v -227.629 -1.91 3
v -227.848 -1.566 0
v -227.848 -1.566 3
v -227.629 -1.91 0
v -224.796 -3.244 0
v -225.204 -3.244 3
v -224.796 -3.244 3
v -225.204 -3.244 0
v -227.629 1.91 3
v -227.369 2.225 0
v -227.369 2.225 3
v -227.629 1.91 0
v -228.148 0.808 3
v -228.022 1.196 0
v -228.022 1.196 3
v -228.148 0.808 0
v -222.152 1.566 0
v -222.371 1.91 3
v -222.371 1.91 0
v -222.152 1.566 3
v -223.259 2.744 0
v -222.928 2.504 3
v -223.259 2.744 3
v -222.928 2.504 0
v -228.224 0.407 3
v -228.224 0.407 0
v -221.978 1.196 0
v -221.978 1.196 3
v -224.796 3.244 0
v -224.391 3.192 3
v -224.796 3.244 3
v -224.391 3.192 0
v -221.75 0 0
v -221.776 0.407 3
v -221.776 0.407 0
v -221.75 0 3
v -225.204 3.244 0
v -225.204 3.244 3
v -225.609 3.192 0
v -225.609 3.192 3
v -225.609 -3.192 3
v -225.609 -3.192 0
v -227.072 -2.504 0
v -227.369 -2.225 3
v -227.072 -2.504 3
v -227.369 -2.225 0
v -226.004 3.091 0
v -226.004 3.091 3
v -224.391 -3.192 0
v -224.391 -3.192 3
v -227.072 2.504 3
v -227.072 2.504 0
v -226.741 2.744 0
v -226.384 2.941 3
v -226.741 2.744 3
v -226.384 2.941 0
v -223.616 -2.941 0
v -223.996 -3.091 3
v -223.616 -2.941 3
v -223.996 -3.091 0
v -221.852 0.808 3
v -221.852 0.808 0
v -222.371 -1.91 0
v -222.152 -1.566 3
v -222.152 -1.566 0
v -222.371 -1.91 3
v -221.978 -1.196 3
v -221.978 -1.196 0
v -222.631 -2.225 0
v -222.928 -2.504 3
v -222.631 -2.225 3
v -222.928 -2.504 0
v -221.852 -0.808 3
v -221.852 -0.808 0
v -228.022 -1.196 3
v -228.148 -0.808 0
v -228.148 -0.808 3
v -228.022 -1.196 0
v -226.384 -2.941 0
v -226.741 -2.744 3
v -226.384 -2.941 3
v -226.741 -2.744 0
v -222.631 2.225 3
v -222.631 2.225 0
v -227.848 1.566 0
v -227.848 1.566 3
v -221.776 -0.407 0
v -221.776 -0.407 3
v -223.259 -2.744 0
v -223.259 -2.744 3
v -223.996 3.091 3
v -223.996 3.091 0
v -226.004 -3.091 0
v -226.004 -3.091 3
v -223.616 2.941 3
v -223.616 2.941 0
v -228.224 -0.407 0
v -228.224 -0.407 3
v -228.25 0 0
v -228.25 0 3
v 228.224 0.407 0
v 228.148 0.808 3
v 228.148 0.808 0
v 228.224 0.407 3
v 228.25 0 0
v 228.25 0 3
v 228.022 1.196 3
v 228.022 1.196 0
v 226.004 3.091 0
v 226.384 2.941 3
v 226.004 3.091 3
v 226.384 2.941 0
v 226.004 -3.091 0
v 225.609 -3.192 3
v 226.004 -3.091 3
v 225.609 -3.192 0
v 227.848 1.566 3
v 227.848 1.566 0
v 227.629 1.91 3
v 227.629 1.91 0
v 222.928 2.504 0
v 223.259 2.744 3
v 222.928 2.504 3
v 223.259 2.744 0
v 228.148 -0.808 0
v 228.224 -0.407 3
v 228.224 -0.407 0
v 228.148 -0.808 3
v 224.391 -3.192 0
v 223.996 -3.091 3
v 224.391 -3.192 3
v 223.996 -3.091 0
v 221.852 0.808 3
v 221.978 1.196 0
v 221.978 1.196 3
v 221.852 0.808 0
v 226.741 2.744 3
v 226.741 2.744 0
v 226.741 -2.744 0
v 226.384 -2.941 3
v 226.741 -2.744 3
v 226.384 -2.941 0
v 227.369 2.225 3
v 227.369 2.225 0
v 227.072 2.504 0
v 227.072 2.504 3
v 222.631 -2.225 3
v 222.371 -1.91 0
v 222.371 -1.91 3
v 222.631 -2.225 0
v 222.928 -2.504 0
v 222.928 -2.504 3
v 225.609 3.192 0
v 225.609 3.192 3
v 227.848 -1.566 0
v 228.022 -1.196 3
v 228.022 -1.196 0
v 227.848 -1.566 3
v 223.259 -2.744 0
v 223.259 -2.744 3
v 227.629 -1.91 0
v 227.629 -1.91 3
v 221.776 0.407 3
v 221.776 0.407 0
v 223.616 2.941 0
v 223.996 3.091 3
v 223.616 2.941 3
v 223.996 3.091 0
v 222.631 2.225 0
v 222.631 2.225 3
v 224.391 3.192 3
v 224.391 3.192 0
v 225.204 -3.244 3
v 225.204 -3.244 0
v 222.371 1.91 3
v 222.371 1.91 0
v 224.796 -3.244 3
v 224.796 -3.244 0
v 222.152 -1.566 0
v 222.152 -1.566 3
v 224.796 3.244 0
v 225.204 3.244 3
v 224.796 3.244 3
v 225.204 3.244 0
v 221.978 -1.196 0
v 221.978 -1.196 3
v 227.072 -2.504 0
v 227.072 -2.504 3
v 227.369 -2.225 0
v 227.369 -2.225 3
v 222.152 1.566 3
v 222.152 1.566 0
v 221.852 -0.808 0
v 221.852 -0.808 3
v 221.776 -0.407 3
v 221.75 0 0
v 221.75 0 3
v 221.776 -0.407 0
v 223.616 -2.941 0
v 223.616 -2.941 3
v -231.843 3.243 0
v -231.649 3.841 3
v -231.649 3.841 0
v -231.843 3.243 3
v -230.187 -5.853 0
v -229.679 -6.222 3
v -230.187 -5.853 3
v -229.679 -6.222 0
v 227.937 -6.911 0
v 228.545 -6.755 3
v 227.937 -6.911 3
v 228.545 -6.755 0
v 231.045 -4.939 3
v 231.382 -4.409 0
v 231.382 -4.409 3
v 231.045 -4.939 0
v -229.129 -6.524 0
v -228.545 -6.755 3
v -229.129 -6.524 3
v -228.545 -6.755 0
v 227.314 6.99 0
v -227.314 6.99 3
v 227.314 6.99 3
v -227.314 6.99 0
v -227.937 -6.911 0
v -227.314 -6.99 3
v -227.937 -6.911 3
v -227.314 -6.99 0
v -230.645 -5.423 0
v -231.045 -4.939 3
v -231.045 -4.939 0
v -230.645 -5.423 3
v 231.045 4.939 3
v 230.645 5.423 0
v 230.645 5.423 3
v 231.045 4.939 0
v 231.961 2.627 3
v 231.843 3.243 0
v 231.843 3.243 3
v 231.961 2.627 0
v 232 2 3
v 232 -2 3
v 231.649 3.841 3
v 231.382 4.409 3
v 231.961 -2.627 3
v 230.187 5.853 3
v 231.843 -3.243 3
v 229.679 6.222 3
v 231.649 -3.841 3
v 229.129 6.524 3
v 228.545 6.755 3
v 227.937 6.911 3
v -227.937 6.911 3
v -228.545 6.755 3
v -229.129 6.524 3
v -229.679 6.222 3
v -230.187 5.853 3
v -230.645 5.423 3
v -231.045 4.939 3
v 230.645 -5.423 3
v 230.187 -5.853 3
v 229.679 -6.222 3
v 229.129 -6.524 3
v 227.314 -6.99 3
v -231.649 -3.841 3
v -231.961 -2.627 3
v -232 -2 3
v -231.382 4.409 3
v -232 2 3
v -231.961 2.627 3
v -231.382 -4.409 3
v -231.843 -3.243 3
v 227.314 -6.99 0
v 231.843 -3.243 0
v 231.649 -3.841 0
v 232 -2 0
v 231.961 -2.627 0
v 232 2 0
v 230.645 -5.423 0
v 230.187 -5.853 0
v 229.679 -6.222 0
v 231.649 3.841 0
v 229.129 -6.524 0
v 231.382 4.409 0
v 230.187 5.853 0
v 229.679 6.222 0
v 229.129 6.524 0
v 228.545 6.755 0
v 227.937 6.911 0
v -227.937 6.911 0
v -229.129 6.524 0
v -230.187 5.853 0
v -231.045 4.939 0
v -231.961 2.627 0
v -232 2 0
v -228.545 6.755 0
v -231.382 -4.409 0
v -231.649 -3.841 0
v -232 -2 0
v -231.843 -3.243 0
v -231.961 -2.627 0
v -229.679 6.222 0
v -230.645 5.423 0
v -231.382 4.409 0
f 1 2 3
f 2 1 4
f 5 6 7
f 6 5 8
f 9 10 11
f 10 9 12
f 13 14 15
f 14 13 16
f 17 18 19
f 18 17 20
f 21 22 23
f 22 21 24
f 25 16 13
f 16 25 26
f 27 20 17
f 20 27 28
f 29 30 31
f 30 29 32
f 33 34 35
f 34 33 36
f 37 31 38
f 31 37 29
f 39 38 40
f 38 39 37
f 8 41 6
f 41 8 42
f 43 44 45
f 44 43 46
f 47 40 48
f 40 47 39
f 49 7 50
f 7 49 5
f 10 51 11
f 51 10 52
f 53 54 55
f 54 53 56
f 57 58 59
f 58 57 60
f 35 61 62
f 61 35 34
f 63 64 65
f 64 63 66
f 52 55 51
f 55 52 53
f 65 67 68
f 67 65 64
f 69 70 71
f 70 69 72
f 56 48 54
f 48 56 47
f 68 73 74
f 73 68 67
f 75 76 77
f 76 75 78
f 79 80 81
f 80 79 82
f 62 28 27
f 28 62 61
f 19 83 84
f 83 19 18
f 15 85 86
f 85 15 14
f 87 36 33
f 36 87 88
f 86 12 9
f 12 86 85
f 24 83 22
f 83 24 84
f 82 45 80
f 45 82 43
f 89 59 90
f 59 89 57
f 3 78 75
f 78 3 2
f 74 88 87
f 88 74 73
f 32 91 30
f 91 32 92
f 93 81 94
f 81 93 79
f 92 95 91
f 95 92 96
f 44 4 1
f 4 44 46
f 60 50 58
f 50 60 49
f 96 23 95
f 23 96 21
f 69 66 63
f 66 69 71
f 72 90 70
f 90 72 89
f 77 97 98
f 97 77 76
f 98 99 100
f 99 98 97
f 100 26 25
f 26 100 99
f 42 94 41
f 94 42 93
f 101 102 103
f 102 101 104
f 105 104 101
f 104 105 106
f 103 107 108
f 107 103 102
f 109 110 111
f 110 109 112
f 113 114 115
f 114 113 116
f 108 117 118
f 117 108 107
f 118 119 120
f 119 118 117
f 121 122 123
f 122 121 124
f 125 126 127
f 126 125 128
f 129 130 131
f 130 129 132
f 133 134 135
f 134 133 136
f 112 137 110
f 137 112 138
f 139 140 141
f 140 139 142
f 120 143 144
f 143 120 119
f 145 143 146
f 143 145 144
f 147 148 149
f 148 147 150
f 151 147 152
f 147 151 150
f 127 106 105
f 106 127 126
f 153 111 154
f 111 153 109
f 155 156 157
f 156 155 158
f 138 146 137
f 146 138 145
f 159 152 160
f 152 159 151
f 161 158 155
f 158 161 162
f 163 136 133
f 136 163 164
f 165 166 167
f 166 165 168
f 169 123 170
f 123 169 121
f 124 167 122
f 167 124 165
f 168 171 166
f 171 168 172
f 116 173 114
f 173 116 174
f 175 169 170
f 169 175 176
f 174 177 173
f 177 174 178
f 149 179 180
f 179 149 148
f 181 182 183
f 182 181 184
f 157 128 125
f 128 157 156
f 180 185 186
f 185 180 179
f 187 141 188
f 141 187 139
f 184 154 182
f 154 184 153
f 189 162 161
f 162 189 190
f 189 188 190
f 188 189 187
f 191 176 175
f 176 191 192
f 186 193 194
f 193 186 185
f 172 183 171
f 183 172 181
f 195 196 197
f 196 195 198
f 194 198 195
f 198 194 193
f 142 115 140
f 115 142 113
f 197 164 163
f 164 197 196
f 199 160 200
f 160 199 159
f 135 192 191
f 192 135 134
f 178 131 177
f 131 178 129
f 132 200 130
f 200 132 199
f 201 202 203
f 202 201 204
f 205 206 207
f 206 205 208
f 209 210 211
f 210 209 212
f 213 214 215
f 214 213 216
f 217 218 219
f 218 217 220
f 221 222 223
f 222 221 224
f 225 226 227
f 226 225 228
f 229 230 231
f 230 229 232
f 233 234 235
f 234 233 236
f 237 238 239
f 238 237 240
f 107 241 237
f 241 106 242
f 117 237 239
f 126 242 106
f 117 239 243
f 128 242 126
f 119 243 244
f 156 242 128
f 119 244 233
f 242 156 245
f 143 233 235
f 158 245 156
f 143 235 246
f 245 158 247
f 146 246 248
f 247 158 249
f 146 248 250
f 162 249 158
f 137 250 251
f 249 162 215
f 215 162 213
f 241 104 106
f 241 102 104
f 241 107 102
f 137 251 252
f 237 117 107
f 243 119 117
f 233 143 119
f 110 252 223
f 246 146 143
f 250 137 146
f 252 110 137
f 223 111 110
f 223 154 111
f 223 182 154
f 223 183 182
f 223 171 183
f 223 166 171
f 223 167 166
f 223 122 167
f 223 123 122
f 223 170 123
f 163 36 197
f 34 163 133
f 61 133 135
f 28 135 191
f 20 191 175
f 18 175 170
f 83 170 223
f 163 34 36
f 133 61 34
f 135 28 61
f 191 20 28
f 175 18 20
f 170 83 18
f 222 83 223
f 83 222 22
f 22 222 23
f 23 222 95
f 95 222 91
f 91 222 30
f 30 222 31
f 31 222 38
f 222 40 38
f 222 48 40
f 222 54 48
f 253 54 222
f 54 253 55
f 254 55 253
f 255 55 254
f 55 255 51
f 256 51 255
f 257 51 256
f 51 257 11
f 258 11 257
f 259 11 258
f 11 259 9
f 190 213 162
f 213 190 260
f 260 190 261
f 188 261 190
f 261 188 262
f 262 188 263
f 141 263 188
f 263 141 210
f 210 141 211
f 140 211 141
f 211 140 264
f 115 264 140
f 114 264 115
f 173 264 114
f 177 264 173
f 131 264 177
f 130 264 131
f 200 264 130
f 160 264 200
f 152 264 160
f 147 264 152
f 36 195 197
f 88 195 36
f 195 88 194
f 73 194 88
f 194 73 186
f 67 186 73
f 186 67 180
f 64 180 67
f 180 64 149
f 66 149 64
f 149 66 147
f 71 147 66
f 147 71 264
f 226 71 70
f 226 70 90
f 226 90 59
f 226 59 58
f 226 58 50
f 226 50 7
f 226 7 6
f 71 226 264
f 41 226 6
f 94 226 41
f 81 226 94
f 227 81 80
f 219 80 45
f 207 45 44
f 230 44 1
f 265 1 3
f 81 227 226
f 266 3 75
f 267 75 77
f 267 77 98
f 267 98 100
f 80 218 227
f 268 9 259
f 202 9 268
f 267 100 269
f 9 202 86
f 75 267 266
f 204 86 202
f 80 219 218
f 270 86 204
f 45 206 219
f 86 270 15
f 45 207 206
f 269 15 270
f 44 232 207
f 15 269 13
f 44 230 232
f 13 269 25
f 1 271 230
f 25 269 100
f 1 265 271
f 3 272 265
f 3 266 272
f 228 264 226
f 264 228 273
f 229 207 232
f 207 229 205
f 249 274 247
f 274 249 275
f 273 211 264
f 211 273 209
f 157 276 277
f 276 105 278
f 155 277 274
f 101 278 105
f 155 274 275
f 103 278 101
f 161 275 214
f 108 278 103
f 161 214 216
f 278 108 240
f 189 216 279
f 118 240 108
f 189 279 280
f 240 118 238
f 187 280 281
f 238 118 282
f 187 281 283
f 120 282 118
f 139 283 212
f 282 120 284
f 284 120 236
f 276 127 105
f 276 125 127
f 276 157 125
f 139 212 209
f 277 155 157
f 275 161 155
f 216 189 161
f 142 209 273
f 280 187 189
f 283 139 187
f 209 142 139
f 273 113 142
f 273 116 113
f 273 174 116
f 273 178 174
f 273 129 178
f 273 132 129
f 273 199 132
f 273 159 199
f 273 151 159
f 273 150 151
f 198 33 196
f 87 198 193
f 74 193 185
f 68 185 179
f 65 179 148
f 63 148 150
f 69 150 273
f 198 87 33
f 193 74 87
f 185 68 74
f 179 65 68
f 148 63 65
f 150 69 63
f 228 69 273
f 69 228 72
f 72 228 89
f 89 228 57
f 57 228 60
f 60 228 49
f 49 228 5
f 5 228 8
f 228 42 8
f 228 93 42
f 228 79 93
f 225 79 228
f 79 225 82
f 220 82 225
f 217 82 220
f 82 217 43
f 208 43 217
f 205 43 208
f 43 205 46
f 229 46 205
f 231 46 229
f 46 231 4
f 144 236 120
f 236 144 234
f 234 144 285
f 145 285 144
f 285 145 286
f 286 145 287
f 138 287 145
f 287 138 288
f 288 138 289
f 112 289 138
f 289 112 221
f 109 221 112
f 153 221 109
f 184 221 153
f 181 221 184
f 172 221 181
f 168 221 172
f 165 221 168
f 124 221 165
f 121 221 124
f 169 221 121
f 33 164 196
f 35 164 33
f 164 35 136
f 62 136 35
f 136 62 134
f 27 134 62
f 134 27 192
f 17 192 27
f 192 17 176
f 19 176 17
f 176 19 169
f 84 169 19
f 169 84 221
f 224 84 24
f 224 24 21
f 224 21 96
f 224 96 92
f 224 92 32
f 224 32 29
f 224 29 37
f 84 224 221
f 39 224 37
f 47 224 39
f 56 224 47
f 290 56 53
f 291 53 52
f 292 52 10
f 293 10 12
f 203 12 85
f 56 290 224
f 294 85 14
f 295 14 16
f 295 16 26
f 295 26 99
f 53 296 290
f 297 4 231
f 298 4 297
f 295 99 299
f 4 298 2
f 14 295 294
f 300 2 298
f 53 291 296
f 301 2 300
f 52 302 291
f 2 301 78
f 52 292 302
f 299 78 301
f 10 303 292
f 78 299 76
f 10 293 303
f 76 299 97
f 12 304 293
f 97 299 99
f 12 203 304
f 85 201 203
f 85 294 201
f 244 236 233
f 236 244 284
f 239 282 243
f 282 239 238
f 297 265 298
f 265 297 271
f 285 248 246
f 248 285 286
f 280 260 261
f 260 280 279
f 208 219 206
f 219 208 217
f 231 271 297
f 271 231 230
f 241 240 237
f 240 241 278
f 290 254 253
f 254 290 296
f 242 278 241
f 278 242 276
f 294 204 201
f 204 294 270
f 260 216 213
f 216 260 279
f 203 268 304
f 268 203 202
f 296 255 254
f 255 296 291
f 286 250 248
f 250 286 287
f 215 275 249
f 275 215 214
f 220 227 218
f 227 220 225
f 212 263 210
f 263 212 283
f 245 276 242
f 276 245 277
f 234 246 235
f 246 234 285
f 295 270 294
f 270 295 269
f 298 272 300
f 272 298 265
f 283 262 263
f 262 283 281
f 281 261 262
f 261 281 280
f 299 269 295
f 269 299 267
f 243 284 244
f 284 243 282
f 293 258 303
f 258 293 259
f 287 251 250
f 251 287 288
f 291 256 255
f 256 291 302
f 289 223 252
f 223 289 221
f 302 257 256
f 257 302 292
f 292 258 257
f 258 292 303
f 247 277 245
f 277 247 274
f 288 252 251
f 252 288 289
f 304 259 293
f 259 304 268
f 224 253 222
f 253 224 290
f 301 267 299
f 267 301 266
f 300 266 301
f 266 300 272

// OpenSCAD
$fn = 50;


difference() {
	union() {
		hull() {
			translate(v = [-227.0000000000, 2.0000000000, 0]) {
				cylinder(h = 3, r = 5);
			}
			translate(v = [227.0000000000, 2.0000000000, 0]) {
				cylinder(h = 3, r = 5);
			}
			translate(v = [-227.0000000000, -2.0000000000, 0]) {
				cylinder(h = 3, r = 5);
			}
			translate(v = [227.0000000000, -2.0000000000, 0]) {
				cylinder(h = 3, r = 5);
			}
		}
	}
	union() {
		translate(v = [-225.0000000000, 0.0000000000, -100.0000000000]) {
			cylinder(h = 200, r = 3.2500000000);
		}
		translate(v = [-225.0000000000, 0.0000000000, -100.0000000000]) {
			cylinder(h = 200, r = 3.2500000000);
		}
		translate(v = [225.0000000000, 0.0000000000, -100.0000000000]) {
			cylinder(h = 200, r = 3.2500000000);
		}
		translate(v = [225.0000000000, 0.0000000000, -100.0000000000]) {
			cylinder(h = 200, r = 3.2500000000);
		}
	}
}
